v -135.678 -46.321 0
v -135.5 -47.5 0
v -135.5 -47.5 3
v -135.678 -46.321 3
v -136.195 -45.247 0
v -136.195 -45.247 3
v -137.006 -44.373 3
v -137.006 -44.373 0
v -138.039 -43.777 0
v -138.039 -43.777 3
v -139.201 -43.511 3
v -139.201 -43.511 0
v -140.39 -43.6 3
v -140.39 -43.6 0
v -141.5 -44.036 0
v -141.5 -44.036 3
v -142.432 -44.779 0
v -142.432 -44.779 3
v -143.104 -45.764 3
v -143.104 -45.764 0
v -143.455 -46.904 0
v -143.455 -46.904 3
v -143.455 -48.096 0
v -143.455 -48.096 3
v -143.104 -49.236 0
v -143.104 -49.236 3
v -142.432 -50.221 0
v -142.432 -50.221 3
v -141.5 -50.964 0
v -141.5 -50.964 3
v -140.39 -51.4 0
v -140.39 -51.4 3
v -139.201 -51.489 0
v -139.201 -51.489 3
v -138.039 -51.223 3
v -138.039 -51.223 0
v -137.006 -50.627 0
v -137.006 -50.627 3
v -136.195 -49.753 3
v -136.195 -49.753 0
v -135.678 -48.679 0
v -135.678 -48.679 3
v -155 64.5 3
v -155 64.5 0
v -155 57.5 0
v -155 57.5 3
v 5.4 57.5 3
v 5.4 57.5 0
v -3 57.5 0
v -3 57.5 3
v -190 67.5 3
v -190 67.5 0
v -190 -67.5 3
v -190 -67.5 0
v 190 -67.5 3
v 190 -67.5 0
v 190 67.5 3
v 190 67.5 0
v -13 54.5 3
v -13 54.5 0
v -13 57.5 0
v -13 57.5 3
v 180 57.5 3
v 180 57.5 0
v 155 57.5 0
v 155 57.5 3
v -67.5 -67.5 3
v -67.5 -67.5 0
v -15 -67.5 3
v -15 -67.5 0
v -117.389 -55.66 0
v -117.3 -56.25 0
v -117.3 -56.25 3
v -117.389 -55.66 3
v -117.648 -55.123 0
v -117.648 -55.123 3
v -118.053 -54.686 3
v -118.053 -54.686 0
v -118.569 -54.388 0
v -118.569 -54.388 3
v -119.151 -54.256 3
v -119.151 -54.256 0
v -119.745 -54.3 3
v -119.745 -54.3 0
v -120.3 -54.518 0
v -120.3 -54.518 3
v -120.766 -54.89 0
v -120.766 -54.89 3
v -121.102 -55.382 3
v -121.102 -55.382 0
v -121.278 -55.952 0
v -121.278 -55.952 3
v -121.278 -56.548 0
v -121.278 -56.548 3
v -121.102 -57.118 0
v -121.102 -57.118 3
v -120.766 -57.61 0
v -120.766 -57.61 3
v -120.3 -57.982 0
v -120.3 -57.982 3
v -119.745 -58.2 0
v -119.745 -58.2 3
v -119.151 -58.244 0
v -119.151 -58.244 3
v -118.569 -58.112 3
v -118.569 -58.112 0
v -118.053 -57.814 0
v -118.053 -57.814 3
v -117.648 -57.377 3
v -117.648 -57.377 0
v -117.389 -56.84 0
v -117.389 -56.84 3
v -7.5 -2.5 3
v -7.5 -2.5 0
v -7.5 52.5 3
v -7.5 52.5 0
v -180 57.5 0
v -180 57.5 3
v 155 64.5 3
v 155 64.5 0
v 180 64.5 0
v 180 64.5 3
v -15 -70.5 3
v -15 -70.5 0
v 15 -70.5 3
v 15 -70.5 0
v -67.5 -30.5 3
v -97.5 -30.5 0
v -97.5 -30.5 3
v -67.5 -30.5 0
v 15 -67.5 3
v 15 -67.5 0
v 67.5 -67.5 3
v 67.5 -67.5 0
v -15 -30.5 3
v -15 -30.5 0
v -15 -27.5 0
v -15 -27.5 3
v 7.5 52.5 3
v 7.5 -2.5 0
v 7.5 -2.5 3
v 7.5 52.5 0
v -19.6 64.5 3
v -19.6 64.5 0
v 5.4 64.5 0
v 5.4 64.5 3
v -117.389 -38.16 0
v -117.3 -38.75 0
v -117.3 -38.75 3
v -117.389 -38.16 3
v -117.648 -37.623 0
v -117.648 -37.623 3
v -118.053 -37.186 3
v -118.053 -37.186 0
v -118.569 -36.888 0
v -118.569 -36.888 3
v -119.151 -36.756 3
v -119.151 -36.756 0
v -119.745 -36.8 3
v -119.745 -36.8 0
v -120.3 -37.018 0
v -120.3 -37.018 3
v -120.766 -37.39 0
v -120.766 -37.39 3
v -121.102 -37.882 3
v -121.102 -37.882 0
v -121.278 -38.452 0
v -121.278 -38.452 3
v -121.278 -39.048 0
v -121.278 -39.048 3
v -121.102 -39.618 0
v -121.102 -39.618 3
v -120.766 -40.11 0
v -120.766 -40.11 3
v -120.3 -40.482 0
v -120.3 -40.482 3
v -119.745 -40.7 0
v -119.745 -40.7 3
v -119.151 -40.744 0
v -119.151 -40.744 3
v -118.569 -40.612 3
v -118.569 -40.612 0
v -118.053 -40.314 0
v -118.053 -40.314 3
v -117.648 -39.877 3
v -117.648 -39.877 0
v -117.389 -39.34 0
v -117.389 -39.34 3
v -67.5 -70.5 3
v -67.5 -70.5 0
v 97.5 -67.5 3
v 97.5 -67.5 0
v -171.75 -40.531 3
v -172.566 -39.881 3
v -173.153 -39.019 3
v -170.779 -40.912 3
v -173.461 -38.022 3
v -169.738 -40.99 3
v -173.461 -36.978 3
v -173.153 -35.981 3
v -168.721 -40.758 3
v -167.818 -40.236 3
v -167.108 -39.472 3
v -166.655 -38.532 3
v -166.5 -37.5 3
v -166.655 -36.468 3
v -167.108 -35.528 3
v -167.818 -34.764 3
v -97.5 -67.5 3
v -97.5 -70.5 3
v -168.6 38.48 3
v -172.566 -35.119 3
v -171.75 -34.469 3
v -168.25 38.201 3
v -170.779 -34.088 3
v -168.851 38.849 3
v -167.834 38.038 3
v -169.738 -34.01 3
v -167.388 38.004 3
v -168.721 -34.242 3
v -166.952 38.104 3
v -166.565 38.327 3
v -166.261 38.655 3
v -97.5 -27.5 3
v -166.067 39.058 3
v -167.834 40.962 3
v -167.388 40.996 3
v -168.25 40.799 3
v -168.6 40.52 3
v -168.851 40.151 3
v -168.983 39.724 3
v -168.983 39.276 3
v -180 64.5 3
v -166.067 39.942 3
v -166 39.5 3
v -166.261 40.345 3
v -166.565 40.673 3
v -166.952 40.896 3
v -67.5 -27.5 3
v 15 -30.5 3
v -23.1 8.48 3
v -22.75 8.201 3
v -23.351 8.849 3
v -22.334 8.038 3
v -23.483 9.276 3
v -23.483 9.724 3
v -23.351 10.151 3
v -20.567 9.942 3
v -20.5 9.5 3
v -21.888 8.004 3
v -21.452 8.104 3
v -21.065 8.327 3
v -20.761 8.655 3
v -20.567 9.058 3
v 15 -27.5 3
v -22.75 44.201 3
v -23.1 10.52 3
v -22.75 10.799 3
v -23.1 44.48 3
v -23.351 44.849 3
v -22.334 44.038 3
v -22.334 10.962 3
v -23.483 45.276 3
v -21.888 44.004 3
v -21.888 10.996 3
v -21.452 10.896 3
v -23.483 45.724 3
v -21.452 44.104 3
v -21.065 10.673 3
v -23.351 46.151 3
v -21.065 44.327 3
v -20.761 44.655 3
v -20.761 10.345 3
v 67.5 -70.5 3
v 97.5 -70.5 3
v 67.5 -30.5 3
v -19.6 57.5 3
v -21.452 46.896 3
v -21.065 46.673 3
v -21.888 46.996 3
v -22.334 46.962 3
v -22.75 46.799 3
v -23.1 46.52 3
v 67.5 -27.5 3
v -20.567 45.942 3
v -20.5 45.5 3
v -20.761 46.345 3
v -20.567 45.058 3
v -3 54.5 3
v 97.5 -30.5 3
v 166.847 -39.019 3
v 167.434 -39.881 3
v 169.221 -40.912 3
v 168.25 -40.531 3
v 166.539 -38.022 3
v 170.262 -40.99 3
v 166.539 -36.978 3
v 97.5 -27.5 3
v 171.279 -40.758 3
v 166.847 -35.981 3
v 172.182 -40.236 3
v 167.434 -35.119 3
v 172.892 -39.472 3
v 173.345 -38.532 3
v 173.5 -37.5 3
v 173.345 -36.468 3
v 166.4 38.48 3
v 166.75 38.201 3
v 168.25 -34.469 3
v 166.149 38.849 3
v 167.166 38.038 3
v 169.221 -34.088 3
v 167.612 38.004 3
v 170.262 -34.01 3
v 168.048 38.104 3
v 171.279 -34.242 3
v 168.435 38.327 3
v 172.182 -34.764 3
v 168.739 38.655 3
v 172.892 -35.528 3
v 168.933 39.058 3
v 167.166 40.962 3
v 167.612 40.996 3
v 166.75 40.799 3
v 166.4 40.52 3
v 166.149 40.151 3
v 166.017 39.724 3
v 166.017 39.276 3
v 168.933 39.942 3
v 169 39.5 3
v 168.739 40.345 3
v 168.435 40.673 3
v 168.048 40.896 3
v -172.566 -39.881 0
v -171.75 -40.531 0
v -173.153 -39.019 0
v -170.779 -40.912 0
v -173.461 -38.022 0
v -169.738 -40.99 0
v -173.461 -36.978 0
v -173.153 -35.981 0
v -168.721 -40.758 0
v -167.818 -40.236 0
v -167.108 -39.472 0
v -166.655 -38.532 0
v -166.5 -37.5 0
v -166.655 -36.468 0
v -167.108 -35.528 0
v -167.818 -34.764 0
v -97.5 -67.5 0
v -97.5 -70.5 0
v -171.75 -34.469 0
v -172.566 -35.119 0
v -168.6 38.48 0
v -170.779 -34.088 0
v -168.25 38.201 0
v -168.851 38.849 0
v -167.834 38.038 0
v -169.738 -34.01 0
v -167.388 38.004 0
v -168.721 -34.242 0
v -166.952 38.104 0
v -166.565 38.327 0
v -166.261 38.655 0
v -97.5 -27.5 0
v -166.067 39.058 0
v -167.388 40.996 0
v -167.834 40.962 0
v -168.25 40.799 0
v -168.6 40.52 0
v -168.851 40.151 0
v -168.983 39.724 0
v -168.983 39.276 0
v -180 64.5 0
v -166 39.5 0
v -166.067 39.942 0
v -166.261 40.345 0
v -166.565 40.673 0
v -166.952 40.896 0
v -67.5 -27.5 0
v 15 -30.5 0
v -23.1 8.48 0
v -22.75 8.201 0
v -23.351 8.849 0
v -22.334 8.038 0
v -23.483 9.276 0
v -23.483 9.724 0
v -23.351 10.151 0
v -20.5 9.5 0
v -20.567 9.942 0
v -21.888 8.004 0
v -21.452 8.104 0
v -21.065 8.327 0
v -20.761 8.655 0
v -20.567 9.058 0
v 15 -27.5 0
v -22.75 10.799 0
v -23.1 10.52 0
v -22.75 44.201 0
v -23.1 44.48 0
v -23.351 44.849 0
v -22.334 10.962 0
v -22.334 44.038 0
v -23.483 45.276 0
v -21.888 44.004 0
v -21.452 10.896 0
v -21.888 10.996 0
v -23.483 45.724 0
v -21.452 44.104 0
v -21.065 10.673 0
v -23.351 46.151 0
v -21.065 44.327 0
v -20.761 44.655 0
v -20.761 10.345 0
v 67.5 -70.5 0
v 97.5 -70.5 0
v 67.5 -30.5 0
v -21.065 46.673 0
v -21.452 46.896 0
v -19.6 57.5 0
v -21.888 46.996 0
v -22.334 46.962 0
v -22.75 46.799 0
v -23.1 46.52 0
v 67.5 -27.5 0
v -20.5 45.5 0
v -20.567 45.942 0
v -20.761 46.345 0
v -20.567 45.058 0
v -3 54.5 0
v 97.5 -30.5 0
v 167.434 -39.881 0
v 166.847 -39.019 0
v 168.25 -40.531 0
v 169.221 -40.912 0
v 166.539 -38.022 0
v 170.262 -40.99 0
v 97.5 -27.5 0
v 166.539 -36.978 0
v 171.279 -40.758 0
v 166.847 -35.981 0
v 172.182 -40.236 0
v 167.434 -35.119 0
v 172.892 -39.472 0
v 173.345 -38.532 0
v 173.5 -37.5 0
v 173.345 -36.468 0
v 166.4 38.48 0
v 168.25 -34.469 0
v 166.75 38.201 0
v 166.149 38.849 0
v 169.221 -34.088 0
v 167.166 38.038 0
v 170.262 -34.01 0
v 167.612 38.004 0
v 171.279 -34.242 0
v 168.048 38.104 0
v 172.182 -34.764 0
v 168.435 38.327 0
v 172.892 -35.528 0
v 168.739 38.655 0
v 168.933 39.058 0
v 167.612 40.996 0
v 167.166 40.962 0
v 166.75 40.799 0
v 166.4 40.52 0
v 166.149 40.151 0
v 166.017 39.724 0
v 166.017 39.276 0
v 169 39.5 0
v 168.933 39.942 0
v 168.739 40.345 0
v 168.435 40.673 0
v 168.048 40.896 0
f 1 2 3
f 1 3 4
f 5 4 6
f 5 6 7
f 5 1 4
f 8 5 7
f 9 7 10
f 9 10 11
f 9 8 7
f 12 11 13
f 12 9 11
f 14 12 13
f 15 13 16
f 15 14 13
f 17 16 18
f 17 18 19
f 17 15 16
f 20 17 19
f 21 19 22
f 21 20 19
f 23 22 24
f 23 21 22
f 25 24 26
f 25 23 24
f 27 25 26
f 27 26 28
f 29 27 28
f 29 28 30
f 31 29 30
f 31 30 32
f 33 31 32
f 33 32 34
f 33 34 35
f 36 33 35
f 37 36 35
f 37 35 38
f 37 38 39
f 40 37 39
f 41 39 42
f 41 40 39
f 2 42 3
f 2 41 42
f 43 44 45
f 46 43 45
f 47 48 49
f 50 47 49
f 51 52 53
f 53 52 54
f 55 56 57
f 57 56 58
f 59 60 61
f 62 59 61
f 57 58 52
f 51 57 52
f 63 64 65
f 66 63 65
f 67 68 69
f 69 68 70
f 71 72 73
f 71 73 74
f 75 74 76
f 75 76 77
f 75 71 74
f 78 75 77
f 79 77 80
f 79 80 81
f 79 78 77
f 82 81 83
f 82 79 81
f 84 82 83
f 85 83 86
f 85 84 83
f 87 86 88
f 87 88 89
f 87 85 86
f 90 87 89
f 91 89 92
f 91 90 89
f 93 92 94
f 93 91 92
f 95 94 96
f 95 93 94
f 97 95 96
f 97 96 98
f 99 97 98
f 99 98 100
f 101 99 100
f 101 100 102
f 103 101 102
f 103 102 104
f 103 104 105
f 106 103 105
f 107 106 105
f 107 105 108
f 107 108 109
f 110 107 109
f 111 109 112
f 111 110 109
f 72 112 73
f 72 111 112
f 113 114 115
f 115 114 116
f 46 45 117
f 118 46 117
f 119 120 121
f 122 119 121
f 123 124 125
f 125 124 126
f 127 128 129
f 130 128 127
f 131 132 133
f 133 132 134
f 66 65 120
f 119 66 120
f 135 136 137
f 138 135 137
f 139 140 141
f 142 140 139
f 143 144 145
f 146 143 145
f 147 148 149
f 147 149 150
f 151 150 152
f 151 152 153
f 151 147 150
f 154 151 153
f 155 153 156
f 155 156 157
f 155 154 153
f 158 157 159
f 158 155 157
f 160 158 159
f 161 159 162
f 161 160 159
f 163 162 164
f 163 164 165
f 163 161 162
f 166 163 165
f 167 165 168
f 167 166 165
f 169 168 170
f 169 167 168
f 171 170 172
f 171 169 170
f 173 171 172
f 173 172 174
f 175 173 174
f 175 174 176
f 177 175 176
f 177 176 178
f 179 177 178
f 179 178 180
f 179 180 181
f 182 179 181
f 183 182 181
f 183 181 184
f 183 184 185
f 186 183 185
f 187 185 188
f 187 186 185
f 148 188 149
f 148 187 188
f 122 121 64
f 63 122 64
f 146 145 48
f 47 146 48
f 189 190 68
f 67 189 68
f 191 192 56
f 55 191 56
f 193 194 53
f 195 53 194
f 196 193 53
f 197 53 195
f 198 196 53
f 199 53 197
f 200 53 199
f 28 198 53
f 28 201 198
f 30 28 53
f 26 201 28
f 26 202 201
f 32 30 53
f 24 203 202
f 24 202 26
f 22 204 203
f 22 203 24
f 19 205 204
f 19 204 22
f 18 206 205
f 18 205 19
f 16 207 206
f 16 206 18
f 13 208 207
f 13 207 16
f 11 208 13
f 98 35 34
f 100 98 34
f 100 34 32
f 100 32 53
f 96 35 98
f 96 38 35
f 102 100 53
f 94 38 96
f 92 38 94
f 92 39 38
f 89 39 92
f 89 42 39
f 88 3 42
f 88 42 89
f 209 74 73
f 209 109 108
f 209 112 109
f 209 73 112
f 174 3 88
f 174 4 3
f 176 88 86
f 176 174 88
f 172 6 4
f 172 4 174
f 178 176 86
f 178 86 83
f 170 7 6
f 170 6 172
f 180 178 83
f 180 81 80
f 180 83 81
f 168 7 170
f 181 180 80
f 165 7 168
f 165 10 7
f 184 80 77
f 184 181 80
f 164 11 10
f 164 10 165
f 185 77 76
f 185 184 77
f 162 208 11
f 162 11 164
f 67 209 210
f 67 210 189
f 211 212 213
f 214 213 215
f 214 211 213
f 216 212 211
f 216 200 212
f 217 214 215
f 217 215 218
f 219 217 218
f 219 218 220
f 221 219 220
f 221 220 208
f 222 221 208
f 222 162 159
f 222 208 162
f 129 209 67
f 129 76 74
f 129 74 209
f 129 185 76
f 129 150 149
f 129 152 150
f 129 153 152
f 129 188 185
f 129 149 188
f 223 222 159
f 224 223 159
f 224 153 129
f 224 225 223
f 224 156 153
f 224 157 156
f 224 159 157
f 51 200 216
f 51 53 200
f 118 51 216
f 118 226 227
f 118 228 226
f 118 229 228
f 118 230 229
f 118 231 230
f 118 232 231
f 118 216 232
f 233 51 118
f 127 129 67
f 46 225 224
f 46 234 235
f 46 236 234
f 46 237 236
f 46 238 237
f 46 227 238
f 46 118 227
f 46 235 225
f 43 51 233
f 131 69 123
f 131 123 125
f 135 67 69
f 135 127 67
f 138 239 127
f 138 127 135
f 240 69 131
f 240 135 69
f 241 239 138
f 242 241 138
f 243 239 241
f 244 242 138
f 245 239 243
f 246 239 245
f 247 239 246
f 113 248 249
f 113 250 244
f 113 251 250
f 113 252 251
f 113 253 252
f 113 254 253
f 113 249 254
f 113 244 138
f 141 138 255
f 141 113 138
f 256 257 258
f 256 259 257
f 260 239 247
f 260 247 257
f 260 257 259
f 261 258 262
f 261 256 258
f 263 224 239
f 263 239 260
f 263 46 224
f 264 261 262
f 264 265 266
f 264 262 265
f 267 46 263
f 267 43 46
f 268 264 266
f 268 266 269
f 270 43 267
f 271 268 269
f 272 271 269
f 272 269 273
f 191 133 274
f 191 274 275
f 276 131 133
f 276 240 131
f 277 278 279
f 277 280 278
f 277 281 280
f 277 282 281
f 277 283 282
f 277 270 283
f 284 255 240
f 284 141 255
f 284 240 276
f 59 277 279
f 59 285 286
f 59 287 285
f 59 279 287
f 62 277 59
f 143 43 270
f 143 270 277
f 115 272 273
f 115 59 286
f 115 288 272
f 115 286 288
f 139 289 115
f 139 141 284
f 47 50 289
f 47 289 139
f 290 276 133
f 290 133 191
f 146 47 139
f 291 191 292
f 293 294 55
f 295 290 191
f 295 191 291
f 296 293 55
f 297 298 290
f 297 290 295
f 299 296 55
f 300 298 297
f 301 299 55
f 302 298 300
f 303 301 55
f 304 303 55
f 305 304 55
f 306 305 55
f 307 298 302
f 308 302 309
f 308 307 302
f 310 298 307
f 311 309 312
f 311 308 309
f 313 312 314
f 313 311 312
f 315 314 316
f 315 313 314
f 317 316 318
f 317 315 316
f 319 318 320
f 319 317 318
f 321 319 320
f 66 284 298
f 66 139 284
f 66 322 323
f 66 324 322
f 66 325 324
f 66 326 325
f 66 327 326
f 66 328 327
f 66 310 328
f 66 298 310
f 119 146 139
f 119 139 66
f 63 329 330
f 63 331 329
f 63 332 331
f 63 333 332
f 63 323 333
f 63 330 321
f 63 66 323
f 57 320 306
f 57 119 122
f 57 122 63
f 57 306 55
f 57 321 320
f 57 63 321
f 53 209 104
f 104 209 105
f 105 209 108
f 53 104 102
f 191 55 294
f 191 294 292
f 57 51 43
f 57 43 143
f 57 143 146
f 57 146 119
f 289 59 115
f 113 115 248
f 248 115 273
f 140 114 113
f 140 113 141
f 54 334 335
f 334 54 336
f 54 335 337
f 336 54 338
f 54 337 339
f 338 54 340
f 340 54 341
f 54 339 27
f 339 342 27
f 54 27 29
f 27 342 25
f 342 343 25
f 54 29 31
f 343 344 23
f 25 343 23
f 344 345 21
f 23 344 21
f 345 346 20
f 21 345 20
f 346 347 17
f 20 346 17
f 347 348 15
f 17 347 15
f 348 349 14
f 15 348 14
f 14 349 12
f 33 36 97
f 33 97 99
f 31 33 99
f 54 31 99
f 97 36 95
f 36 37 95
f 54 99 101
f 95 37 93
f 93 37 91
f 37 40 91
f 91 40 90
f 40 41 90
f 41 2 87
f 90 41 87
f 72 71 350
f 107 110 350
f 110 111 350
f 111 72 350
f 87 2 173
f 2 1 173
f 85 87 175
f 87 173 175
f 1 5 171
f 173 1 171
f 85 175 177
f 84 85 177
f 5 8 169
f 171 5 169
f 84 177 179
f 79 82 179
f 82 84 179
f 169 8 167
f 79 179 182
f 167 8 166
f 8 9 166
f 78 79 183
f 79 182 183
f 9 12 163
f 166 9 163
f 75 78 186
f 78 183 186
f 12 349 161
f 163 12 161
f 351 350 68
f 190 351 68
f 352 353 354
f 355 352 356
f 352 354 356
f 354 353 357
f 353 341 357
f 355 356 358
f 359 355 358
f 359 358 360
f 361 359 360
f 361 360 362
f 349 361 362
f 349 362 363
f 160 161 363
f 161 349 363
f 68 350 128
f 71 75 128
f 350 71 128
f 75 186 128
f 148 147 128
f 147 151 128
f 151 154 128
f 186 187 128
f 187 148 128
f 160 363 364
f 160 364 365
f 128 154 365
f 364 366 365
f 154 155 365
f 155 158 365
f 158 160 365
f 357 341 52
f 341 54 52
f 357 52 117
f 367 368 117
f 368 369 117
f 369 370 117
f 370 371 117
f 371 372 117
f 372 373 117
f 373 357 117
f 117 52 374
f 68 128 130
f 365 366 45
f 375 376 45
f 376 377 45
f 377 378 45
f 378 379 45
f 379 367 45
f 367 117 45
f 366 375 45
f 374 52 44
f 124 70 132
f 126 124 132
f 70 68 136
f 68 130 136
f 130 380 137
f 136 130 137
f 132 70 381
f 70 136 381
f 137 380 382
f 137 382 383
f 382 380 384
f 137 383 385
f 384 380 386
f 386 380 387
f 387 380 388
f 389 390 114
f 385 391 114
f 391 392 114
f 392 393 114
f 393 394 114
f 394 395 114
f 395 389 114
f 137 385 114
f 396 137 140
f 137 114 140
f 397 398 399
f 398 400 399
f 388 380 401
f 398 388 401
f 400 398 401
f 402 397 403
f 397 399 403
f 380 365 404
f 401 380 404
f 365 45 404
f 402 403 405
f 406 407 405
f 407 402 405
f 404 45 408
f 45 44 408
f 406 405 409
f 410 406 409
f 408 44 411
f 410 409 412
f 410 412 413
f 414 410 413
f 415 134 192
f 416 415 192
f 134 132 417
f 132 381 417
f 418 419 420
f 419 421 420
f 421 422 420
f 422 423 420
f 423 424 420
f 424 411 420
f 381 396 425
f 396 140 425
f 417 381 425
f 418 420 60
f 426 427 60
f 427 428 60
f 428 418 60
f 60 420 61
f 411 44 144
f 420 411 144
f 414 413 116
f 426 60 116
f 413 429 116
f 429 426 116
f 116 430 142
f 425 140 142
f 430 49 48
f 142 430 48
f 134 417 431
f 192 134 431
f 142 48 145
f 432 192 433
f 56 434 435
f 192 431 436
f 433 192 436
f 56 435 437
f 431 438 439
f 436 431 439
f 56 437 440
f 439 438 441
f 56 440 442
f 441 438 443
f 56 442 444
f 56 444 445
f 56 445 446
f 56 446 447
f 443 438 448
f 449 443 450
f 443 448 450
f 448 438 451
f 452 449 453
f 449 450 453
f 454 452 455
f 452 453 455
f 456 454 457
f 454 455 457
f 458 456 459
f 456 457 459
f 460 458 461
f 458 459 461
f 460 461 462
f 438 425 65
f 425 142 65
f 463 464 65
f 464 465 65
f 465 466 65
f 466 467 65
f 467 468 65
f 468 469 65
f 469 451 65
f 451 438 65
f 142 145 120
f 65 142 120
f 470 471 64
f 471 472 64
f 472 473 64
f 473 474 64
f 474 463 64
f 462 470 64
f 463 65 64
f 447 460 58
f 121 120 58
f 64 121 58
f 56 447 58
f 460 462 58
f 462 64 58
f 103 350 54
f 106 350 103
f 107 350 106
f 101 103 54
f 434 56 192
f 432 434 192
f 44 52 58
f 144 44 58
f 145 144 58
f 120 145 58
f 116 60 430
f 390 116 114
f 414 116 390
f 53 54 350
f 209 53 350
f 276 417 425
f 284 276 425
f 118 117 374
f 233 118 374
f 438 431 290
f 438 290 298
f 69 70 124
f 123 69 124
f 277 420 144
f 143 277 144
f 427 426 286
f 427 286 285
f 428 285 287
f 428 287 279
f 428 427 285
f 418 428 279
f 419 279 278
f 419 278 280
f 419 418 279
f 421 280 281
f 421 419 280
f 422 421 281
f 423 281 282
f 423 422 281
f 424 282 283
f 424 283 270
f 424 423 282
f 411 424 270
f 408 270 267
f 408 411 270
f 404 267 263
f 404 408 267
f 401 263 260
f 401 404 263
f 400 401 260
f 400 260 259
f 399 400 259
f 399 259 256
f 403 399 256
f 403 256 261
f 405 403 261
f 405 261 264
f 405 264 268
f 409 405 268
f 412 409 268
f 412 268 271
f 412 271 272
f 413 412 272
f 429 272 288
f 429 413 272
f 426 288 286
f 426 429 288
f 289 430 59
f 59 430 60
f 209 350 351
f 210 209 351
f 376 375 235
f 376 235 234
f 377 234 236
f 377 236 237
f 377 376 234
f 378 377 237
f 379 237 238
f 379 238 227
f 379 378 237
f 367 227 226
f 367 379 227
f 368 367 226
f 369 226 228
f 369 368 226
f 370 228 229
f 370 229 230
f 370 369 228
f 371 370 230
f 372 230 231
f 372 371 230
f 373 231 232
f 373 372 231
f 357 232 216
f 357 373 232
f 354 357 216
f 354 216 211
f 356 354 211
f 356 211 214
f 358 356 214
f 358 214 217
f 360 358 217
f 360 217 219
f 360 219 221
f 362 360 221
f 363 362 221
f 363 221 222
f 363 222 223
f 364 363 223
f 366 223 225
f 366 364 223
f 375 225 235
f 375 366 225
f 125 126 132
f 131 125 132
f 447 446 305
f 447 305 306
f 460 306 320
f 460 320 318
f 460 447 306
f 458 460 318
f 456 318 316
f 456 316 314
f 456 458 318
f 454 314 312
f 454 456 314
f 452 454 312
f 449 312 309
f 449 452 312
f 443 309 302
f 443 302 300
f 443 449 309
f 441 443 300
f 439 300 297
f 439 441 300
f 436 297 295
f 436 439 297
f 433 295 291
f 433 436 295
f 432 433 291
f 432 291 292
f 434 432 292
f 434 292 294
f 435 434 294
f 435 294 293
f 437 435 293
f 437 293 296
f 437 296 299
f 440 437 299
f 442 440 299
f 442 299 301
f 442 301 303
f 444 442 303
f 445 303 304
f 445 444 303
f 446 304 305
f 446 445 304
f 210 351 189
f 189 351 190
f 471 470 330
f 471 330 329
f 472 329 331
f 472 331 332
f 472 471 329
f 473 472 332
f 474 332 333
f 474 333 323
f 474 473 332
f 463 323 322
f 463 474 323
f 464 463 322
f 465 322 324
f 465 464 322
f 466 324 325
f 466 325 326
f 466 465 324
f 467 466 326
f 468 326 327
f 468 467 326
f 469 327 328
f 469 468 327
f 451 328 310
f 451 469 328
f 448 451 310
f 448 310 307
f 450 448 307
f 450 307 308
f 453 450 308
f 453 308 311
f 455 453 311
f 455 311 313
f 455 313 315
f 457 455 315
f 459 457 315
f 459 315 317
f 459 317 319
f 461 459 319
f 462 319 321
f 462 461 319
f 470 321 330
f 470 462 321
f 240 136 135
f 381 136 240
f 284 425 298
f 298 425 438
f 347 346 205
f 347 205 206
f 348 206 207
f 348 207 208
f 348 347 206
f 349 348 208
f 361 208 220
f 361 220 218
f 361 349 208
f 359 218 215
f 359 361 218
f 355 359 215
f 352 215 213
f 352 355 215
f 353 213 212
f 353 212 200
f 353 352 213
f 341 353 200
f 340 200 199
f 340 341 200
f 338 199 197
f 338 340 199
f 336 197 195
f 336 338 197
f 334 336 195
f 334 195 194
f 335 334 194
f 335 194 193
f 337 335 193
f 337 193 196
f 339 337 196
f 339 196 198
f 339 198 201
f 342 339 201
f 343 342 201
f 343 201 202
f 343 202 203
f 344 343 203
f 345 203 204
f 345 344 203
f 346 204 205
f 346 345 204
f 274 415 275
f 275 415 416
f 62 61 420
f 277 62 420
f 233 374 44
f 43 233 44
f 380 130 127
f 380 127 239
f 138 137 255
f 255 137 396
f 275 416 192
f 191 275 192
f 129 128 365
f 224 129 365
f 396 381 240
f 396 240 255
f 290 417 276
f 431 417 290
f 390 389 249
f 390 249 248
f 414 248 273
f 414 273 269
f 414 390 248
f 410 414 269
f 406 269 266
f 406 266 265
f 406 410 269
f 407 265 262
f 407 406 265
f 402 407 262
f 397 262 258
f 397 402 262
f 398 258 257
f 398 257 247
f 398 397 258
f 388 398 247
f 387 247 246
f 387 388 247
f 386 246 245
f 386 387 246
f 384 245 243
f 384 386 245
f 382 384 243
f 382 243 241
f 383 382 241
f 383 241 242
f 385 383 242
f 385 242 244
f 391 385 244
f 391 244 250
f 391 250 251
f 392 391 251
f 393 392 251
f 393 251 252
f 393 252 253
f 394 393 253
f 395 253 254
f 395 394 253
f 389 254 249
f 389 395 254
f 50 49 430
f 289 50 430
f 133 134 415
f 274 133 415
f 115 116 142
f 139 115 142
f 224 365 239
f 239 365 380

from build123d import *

# Parameters (mm, degrees)
CROQUIS1_R              = 2
CROQUIS1_R_2            = 3.5
CROQUIS1_R_3            = 4
CROQUIS1_W              = 30
CROQUIS1_H              = 3
CROQUIS1_R_4            = 1.5
CROQUIS1_W_2            = 15
CROQUIS1_H_2            = 55
SALIENTE_EXTRUIR4_DEPTH = 3


with BuildPart() as part:
    # Croquis1 → Saliente-Extruir4 (new body)
    with BuildSketch(Plane.XY):
        Polygon((-190, 67.5), (-190, -67.5), (-97.5, -67.5), (-97.5, -70.5), (-67.5, -70.5), (-67.5, -67.5), (-15, -67.5), (-15, -70.5), (15, -70.5), (15, -67.5), (67.5, -67.5), (67.5, -70.5), (97.5, -70.5), (97.5, -67.5), (190, -67.5), (190, 67.5), align=None)
        with Locations((-119.3, -56.25)):
            Circle(CROQUIS1_R, mode=Mode.SUBTRACT)
        with Locations((-170, -37.5)):
            Circle(CROQUIS1_R_2, mode=Mode.SUBTRACT)
        with Locations((-139.5, -47.5)):
            Circle(CROQUIS1_R_3, mode=Mode.SUBTRACT)
        with Locations((-119.3, -38.75)):
            Circle(CROQUIS1_R, mode=Mode.SUBTRACT)
        with Locations((-82.5, -29)):
            Rectangle(CROQUIS1_W, CROQUIS1_H, mode=Mode.SUBTRACT)
        with Locations((170, -37.5)):
            Circle(CROQUIS1_R_2, mode=Mode.SUBTRACT)
        with Locations((0, -29)):
            Rectangle(CROQUIS1_W, CROQUIS1_H, mode=Mode.SUBTRACT)
        with Locations((82.5, -29)):
            Rectangle(CROQUIS1_W, CROQUIS1_H, mode=Mode.SUBTRACT)
        with Locations((-22, 9.5)):
            Circle(CROQUIS1_R_4, mode=Mode.SUBTRACT)
        with Locations((0, 25)):
            Rectangle(CROQUIS1_W_2, CROQUIS1_H_2, mode=Mode.SUBTRACT)
        with Locations((-167.5, 39.5)):
            Circle(CROQUIS1_R_4, mode=Mode.SUBTRACT)
        Polygon((-180, 57.5), (-180, 64.5), (-155, 64.5), (-155, 57.5), (-163.4, 57.5), (-173.4, 57.5), align=None, mode=Mode.SUBTRACT)
        with Locations((-22, 45.5)):
            Circle(CROQUIS1_R_4, mode=Mode.SUBTRACT)
        Polygon((-19.6, 57.5), (-19.6, 64.5), (5.4, 64.5), (5.4, 57.5), (-3, 57.5), (-3, 54.5), (-13, 54.5), (-13, 57.5), align=None, mode=Mode.SUBTRACT)
        with Locations((167.5, 39.5)):
            Circle(CROQUIS1_R_4, mode=Mode.SUBTRACT)
        Polygon((155, 57.5), (155, 64.5), (180, 64.5), (180, 57.5), (171.6, 57.5), (161.6, 57.5), align=None, mode=Mode.SUBTRACT)
    extrude(amount=SALIENTE_EXTRUIR4_DEPTH)


solid = part.part
